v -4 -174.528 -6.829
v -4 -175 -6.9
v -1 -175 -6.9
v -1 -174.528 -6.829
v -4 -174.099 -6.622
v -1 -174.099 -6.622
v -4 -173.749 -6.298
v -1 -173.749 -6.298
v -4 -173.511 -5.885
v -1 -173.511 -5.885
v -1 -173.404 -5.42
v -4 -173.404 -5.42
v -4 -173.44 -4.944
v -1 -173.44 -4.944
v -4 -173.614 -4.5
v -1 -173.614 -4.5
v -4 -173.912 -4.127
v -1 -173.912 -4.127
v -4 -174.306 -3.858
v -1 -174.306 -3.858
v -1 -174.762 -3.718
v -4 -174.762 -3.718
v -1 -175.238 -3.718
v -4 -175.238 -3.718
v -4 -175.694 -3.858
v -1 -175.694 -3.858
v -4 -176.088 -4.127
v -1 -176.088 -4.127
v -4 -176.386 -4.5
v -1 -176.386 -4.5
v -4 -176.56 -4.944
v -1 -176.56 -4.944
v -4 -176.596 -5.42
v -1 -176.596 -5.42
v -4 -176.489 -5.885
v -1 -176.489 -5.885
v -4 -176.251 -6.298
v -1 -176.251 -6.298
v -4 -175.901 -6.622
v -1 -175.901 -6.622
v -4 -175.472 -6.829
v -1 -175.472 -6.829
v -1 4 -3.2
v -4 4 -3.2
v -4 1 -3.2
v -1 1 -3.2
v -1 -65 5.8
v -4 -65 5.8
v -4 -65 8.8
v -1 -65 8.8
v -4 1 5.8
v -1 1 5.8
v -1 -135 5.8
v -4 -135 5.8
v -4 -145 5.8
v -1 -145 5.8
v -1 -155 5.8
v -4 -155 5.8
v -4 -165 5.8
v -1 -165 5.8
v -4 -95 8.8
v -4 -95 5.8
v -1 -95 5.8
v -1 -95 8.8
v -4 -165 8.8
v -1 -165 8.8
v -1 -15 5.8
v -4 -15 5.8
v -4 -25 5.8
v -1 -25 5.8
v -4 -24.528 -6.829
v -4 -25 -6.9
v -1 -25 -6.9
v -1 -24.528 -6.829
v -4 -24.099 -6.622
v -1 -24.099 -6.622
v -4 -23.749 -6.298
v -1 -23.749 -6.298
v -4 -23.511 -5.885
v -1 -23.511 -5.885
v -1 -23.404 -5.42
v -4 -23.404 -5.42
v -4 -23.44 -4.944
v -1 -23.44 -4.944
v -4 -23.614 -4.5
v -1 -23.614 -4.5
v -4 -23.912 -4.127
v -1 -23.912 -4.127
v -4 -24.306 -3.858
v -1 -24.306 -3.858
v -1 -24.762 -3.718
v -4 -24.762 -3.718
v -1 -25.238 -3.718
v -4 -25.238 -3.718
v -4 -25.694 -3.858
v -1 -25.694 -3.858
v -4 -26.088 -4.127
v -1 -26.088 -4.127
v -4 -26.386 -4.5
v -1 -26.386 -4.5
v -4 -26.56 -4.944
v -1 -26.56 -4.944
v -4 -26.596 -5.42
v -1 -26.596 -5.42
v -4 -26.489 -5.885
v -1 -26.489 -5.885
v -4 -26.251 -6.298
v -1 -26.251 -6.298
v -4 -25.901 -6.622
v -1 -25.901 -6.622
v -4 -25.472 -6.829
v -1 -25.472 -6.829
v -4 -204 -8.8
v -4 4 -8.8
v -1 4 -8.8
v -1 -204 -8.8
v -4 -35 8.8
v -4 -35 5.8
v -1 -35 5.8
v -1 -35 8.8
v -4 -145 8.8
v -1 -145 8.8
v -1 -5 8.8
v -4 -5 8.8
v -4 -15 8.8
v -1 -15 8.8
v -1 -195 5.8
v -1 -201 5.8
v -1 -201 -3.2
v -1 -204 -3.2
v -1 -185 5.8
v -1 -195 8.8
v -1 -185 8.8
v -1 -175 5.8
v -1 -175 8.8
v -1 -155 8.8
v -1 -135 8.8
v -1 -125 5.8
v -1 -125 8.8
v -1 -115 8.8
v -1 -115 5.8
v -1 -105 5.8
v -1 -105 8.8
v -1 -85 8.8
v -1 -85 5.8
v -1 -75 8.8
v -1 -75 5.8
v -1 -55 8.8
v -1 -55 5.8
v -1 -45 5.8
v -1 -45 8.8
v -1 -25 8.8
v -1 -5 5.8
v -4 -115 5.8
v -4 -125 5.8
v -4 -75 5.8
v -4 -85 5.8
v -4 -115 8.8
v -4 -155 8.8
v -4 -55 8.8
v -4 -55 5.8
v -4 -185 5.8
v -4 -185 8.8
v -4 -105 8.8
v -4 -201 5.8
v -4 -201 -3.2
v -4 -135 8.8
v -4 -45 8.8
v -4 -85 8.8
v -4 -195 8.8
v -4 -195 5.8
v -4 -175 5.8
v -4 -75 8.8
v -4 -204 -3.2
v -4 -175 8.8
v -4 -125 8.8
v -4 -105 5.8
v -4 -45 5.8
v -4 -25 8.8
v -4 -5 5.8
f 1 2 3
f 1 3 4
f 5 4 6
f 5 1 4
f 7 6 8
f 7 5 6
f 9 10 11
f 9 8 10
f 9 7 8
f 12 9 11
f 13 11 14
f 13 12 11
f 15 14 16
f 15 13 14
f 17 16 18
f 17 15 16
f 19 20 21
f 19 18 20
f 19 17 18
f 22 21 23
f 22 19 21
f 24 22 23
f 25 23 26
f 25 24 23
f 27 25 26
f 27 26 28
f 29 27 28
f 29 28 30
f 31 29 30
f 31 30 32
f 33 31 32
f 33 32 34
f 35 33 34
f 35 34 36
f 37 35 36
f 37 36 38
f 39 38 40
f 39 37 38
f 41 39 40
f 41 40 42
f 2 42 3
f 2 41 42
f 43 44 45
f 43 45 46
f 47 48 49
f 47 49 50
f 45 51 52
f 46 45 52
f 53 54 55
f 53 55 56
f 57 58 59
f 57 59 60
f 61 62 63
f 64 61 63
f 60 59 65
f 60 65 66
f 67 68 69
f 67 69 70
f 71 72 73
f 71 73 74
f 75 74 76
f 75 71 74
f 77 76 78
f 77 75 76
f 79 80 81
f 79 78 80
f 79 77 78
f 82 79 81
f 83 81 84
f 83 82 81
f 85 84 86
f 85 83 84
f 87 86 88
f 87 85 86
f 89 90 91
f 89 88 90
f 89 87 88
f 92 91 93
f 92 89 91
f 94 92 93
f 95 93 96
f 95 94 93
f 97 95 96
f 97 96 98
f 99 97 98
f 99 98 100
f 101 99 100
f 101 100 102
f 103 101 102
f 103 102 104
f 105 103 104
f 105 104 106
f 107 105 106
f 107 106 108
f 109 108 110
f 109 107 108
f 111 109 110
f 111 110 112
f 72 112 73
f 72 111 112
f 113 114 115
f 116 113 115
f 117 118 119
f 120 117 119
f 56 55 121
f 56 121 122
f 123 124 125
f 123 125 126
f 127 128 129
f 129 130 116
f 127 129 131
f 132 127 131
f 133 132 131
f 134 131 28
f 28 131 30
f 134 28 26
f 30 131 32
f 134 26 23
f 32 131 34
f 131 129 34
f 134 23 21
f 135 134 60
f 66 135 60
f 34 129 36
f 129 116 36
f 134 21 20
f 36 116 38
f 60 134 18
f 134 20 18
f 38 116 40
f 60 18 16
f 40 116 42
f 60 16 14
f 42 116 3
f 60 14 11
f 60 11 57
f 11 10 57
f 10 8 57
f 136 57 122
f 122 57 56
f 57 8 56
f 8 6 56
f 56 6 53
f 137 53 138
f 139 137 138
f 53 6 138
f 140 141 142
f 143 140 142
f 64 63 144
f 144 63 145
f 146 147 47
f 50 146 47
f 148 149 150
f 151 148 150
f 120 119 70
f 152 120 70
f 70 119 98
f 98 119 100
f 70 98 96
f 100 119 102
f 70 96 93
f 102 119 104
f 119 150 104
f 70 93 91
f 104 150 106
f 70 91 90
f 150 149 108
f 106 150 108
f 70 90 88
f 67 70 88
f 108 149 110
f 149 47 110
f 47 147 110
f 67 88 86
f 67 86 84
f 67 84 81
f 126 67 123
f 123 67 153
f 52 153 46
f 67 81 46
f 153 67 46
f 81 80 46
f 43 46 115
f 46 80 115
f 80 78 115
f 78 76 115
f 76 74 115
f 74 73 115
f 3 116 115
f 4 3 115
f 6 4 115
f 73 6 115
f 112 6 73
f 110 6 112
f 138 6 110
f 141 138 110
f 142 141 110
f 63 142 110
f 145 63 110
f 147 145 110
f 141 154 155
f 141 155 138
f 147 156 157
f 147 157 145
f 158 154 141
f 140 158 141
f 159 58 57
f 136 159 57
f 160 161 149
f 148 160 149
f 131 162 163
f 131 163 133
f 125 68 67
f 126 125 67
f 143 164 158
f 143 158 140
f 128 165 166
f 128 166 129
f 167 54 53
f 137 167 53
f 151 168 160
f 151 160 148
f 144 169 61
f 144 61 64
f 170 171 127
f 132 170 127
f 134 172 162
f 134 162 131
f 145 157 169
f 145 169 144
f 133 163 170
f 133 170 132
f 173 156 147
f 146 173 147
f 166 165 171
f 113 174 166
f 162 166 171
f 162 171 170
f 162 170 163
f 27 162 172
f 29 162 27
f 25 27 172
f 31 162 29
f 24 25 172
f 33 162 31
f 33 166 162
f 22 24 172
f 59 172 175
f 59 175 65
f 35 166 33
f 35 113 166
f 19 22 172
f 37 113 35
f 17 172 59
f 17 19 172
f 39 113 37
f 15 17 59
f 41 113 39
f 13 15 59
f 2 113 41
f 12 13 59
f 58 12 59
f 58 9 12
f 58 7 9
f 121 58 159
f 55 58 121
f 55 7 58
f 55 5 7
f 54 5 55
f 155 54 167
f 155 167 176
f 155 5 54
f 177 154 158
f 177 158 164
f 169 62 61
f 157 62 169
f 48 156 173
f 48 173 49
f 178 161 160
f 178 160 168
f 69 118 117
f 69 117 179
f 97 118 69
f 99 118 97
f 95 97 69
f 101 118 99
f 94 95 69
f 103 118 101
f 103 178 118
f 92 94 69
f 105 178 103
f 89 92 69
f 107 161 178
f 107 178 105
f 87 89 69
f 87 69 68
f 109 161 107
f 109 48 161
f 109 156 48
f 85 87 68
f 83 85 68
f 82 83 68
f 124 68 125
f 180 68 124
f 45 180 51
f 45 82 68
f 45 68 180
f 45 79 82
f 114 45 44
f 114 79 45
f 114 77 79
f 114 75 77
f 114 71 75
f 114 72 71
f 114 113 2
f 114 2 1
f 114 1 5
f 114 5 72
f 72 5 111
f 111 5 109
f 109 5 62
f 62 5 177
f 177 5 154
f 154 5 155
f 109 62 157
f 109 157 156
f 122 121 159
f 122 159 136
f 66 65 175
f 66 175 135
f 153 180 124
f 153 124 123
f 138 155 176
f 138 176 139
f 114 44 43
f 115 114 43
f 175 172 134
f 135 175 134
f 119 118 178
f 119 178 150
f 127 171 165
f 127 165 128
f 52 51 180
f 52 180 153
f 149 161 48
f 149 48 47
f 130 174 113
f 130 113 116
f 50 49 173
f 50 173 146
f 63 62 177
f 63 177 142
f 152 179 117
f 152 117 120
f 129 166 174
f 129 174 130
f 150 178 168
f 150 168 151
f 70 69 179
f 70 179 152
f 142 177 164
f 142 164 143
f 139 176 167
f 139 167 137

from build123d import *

# Parameters (mm, degrees)
CYLINDER025_R           = 1.6
CYLINDER025_DEPTH       = 10
CYLINDER025_PITCH_ANGLE = 90
CYLINDER024_R           = 1.6
CYLINDER024_DEPTH       = 10
CYLINDER024_PITCH_ANGLE = 90
BOX040_W                = 3
BOX040_H                = 3
BOX040_DEPTH            = 10
BOX039_W                = 3
BOX039_H                = 3
BOX039_DEPTH            = 10
BOX038_W                = 5
BOX038_H                = 10
BOX038_DEPTH            = 3
ARRAY022_Y_COUNT        = 11
ARRAY022_Y_PITCH        = 20
BOX037_W                = 3
BOX037_H                = 208
BOX037_DEPTH            = 17.6


with BuildPart() as cylinder025:
    # Cylinder025 → Cylinder025 (new body)
    with BuildSketch(Plane.XY):
        Circle(CYLINDER025_R)
    extrude(amount=CYLINDER025_DEPTH)


with BuildPart() as cylinder025_1:
    # Cylinder025 pitch: moved
    add(cylinder025.part.rotate(Axis((0, 0, 0), (0, 1, 0)), CYLINDER025_PITCH_ANGLE))


with BuildPart() as cylinder025_2:
    # Cylinder025 placement: moved
    add(cylinder025_1.part.moved(Location((-5, -25, -5.3))))


with BuildPart() as cylinder024:
    # Cylinder024 → Cylinder024 (new body)
    with BuildSketch(Plane.XY):
        Circle(CYLINDER024_R)
    extrude(amount=CYLINDER024_DEPTH)


with BuildPart() as cylinder024_1:
    # Cylinder024 pitch: moved
    add(cylinder024.part.rotate(Axis((0, 0, 0), (0, 1, 0)), CYLINDER024_PITCH_ANGLE))


with BuildPart() as cylinder024_2:
    # Cylinder024 placement: moved
    add(cylinder024_1.part.moved(Location((-5, -175, -5.3))))


with BuildPart() as cube040:
    # Box040 → Box040 (new body)
    with BuildSketch(Plane(origin=(-4, -204, -3.2), x_dir=(1, 0, 0), z_dir=(0, 0, 1))):
        with Locations((1.5, 1.5)):
            Rectangle(BOX040_W, BOX040_H)
    extrude(amount=BOX040_DEPTH)


with BuildPart() as cube039:
    # Box039 → Box039 (new body)
    with BuildSketch(Plane(origin=(-4, 1, -3.2), x_dir=(1, 0, 0), z_dir=(0, 0, 1))):
        with Locations((1.5, 1.5)):
            Rectangle(BOX039_W, BOX039_H)
    extrude(amount=BOX039_DEPTH)


with BuildPart() as array022:
    # Box038 → Box038 (new body)
    with BuildSketch(Plane(origin=(-1, -1, 7), x_dir=(1, 0, 0), z_dir=(0, 0, 1))):
        with Locations((2.5, 5)):
            Rectangle(BOX038_W, BOX038_H)
    extrude(amount=BOX038_DEPTH)

    # Array022 Y: Array022 ×11


with BuildPart() as array022_1:
    add(array022.part)
    with Locations(*[(0, i * ARRAY022_Y_PITCH, 0) for i in range(1, ARRAY022_Y_COUNT)]):
        add(array022.part)


with BuildPart() as sidepanel01:
    # Box037 → Box037 (new body)
    with BuildSketch(Plane.XY.offset(-7.6)):
        with Locations((1.5, 104)):
            Rectangle(BOX037_W, BOX037_H)
    extrude(amount=BOX037_DEPTH)

    # Cut035: cut Array022
    add(array022_1.part, mode=Mode.SUBTRACT)


with BuildPart() as sidepanel01_1:
    # Cut035 placement: moved
    add(sidepanel01.part.moved(Location((-4, -204, -1.2))))

    # Cut036: cut Cube039
    add(cube039.part, mode=Mode.SUBTRACT)

    # Cut037: cut Cube040
    add(cube040.part, mode=Mode.SUBTRACT)

    # Cut050: cut Cylinder024
    add(cylinder024_2.part, mode=Mode.SUBTRACT)

    # Cut051: cut Cylinder025
    add(cylinder025_2.part, mode=Mode.SUBTRACT)


solid = sidepanel01_1.part
